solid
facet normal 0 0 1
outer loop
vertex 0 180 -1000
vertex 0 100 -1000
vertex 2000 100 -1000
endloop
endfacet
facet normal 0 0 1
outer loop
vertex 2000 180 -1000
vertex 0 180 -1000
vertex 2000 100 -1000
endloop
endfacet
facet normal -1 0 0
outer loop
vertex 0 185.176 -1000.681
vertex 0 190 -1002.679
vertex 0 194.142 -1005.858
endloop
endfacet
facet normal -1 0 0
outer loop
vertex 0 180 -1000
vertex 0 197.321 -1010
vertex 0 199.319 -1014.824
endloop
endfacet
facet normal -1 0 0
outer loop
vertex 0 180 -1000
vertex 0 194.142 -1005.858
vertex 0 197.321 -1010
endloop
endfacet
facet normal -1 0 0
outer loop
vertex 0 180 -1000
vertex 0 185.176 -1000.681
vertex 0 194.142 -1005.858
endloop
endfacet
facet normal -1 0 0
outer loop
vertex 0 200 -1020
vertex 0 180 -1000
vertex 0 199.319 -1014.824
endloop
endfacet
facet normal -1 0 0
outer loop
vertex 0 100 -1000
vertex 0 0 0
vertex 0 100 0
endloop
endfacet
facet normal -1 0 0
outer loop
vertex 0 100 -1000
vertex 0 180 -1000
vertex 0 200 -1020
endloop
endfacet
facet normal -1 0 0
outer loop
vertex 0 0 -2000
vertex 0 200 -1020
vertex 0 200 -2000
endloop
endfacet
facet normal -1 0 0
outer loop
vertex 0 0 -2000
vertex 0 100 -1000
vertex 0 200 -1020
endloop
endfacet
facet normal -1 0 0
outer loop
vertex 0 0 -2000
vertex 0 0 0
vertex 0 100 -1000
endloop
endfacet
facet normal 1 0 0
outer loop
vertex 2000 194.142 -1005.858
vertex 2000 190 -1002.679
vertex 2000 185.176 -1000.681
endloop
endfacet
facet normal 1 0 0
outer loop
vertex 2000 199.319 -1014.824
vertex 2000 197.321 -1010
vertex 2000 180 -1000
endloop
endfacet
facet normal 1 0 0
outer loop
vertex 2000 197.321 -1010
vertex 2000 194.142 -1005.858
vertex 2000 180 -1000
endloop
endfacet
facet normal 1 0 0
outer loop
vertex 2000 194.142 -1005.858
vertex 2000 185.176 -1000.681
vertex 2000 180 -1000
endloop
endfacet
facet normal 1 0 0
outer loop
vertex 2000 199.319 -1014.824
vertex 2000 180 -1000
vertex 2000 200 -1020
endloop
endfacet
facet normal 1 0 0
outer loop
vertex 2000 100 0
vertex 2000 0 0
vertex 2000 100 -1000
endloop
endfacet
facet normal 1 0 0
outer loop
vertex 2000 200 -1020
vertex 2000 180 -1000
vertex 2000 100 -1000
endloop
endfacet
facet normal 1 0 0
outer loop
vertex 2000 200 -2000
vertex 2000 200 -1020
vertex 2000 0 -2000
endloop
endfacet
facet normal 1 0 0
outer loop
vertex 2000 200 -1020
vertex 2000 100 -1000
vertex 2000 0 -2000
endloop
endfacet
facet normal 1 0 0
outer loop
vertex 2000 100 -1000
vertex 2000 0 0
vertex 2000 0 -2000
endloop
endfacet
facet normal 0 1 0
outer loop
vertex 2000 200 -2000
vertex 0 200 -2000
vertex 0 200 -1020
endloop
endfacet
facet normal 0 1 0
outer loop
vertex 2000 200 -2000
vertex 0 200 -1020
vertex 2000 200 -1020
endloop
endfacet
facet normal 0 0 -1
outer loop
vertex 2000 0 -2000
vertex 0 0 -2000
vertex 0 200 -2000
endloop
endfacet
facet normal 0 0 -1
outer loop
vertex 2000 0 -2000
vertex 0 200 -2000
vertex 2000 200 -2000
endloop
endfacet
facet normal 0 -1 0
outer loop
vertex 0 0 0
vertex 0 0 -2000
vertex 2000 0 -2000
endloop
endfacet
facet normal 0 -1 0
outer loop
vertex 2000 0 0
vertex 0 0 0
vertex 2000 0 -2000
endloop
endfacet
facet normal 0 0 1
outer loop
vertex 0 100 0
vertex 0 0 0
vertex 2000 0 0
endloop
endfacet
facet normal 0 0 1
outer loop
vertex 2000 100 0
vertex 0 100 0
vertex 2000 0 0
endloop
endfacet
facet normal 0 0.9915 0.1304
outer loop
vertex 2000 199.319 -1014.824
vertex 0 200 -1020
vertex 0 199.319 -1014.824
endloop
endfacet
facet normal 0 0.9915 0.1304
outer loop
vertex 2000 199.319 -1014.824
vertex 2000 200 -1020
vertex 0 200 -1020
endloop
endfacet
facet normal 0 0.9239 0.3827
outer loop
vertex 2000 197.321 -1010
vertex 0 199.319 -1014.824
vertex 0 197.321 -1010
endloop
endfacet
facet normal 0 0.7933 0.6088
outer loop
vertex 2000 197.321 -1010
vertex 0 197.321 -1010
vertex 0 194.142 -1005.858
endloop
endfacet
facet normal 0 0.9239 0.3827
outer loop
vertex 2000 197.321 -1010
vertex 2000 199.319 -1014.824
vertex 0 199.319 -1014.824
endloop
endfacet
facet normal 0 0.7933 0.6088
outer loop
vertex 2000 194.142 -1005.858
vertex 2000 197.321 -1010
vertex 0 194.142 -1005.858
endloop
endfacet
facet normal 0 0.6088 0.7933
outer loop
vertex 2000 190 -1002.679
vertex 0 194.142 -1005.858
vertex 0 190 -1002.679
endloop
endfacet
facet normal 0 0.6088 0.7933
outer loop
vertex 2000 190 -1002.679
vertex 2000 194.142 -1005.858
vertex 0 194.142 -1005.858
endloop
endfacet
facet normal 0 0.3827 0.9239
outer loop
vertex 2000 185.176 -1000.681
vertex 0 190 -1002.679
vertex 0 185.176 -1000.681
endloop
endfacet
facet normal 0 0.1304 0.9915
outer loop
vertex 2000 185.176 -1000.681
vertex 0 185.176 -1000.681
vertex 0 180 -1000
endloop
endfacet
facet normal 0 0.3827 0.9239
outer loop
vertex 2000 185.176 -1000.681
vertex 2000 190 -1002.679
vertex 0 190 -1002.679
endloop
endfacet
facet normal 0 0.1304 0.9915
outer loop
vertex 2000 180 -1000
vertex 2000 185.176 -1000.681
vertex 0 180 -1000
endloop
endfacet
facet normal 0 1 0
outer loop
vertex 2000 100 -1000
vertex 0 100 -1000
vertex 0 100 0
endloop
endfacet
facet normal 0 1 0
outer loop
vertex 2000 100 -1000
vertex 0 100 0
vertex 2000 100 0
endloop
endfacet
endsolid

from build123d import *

# Parameters (mm, degrees)
SKETCH1_W           = 2000
SKETCH1_H           = 2000
BOSS_EXTRUDE1_DEPTH = 100
SKETCH2_W           = 2000
SKETCH2_H           = 1000
BOSS_EXTRUDE2_DEPTH = 100
FILLET1_R           = 20


with BuildPart() as part:
    # Sketch1 → Boss-Extrude1 (new body)
    with BuildSketch(Plane(origin=(0, 0, 0), x_dir=(1, 0, 0), z_dir=(0, 1, 0))):
        with Locations((1000, 1000)):
            Rectangle(SKETCH1_W, SKETCH1_H)
    extrude(amount=BOSS_EXTRUDE1_DEPTH)

    # Sketch2 → Boss-Extrude2 (add)
    with BuildSketch(Plane(origin=(0, 100, 0), x_dir=(1, 0, 0), z_dir=(0, 1, 0))):
        with Locations((1000, 1500)):
            Rectangle(SKETCH2_W, SKETCH2_H)
    extrude(amount=BOSS_EXTRUDE2_DEPTH)

    # Fillet1
    fillet1_edges = [part.edges().sort_by_distance(p)[0] for p in [
        (1000, 200, -1000),
    ]]
    fillet(fillet1_edges, radius=FILLET1_R)


solid = part.part
